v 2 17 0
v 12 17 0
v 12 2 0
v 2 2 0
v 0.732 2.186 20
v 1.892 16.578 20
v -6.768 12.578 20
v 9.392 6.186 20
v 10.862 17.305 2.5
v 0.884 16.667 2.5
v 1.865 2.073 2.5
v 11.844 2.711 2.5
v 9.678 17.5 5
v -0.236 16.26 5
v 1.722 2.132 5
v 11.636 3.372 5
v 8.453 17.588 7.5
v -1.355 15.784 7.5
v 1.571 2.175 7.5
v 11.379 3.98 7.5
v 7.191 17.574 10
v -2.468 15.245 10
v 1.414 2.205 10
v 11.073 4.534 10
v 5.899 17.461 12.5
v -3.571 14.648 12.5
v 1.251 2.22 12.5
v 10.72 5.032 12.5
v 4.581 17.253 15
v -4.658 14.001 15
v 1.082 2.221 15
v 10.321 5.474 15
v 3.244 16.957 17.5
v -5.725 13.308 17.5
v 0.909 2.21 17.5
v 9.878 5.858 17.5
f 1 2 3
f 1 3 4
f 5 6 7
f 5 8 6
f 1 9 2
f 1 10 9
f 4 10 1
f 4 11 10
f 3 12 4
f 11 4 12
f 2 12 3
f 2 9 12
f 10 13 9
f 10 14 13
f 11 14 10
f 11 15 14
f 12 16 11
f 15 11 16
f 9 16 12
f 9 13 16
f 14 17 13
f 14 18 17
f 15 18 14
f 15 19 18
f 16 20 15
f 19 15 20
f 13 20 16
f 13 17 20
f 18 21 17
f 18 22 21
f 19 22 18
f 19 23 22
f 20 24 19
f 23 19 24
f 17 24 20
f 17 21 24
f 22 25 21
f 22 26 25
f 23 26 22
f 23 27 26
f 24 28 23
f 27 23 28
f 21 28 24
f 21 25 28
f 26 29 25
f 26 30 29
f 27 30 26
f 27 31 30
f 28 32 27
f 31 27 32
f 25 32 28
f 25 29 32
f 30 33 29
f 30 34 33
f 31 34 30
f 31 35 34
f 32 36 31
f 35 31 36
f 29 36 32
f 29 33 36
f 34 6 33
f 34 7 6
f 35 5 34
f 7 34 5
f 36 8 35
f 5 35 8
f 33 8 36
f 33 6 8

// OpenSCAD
linear_extrude(height=20, scale=[1,.8], twist=-30, slices=8) {
    translate([2,2,0]) {
        polygon(
            points=[
               [0,0],
               [10,0],
               [10,15],
               [0,15]],
            paths=[
               [3, 2, 1, 0],
            ]
        );
    }
}
